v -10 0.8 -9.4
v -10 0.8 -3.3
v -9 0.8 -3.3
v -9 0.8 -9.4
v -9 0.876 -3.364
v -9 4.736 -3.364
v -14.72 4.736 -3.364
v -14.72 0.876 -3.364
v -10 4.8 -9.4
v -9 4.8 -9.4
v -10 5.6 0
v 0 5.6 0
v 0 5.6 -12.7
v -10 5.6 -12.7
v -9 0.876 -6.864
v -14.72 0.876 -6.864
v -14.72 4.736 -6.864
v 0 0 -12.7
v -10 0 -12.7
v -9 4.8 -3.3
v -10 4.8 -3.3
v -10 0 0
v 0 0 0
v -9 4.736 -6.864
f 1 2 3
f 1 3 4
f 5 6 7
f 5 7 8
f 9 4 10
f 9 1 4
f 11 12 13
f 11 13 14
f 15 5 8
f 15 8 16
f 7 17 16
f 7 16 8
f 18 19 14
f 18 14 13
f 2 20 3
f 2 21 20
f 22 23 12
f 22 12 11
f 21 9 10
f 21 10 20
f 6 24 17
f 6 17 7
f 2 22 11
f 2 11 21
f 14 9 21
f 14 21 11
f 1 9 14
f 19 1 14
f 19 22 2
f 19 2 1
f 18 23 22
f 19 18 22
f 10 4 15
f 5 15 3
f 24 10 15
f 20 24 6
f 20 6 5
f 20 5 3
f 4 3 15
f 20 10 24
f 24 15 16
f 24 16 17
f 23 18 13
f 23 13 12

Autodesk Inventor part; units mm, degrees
ref_plane "YZ Plane" through (0, 0, 0) normal (1, 0, 0) x (0, 1, 0)
ref_plane "XZ Plane" through (0, 0, 0) normal (0, 1, 0) x (-1, 0, 0)
ref_plane "XY Plane" through (0, 0, 0) normal (0, 0, 1) x (1, 0, 0)
sketch "Sketch1" plane through (0, 0, 0) normal (0, 1, 0) x (-1, 0, 0)
  line L0 (0, 0) -> (10, 0)
  line L1 (10, 0) -> (10, -12.7)
  line L2 (10, -12.7) -> (0, -12.7)
  line L3 (0, -12.7) -> (0, 0)
  dimension "d0" = 10
  dimension "d1" = 12.7
extrude "Extrusion1" add sketch "Sketch1" along normal blind 5.6
sketch "Sketch2" plane through (-10, 0, -12.7) normal (-1, 0, 0) x (0, 0, 1)
  line L0 (3.3, 4.8) -> (9.4, 4.8)
  line L1 (9.4, 4.8) -> (9.4, 0.8)
  line L2 (9.4, 0.8) -> (3.3, 0.8)
  line L3 (3.3, 0.8) -> (3.3, 4.8)
  line L4 (0, 0) -> (0, 5.6) projected
  point P0 (12.7, 0)
  point P1 (6.35, 4.8)
  point P2 (9.4, 2.8)
  dimension "d4" = 6.1
  dimension "d5" = 4
  dimension "d6" = 2.8
  dimension "d7" = 6.35
extrude "Extrusion2" cut sketch "Sketch2" against normal blind 1
sketch "Sketch3" plane through (-9, 0, -12.7) normal (-1, 0, 0) x (0, 0, 1)
  line L0 (5.8365, 4.7365) -> (9.3365, 4.7365)
  line L1 (9.3365, 4.7365) -> (9.3365, 0.8765)
  line L2 (9.3365, 0.8765) -> (5.8365, 0.8765)
  line L3 (5.8365, 0.8765) -> (5.8365, 4.7365)
  line L4 (9.4, 4.8) -> (9.4, 0.8) projected
  line L5 (3.3, 4.8) -> (9.4, 4.8) projected
  point P0 (12.7, 0)
  dimension "d10" = 3.5
  dimension "d11" = 3.86
  dimension "d12" = 0.0635
  dimension "d13" = 0.0635
extrude "Extrusion3" add sketch "Sketch3" along normal blind 5.72
properties part number "103-5007-EV"
